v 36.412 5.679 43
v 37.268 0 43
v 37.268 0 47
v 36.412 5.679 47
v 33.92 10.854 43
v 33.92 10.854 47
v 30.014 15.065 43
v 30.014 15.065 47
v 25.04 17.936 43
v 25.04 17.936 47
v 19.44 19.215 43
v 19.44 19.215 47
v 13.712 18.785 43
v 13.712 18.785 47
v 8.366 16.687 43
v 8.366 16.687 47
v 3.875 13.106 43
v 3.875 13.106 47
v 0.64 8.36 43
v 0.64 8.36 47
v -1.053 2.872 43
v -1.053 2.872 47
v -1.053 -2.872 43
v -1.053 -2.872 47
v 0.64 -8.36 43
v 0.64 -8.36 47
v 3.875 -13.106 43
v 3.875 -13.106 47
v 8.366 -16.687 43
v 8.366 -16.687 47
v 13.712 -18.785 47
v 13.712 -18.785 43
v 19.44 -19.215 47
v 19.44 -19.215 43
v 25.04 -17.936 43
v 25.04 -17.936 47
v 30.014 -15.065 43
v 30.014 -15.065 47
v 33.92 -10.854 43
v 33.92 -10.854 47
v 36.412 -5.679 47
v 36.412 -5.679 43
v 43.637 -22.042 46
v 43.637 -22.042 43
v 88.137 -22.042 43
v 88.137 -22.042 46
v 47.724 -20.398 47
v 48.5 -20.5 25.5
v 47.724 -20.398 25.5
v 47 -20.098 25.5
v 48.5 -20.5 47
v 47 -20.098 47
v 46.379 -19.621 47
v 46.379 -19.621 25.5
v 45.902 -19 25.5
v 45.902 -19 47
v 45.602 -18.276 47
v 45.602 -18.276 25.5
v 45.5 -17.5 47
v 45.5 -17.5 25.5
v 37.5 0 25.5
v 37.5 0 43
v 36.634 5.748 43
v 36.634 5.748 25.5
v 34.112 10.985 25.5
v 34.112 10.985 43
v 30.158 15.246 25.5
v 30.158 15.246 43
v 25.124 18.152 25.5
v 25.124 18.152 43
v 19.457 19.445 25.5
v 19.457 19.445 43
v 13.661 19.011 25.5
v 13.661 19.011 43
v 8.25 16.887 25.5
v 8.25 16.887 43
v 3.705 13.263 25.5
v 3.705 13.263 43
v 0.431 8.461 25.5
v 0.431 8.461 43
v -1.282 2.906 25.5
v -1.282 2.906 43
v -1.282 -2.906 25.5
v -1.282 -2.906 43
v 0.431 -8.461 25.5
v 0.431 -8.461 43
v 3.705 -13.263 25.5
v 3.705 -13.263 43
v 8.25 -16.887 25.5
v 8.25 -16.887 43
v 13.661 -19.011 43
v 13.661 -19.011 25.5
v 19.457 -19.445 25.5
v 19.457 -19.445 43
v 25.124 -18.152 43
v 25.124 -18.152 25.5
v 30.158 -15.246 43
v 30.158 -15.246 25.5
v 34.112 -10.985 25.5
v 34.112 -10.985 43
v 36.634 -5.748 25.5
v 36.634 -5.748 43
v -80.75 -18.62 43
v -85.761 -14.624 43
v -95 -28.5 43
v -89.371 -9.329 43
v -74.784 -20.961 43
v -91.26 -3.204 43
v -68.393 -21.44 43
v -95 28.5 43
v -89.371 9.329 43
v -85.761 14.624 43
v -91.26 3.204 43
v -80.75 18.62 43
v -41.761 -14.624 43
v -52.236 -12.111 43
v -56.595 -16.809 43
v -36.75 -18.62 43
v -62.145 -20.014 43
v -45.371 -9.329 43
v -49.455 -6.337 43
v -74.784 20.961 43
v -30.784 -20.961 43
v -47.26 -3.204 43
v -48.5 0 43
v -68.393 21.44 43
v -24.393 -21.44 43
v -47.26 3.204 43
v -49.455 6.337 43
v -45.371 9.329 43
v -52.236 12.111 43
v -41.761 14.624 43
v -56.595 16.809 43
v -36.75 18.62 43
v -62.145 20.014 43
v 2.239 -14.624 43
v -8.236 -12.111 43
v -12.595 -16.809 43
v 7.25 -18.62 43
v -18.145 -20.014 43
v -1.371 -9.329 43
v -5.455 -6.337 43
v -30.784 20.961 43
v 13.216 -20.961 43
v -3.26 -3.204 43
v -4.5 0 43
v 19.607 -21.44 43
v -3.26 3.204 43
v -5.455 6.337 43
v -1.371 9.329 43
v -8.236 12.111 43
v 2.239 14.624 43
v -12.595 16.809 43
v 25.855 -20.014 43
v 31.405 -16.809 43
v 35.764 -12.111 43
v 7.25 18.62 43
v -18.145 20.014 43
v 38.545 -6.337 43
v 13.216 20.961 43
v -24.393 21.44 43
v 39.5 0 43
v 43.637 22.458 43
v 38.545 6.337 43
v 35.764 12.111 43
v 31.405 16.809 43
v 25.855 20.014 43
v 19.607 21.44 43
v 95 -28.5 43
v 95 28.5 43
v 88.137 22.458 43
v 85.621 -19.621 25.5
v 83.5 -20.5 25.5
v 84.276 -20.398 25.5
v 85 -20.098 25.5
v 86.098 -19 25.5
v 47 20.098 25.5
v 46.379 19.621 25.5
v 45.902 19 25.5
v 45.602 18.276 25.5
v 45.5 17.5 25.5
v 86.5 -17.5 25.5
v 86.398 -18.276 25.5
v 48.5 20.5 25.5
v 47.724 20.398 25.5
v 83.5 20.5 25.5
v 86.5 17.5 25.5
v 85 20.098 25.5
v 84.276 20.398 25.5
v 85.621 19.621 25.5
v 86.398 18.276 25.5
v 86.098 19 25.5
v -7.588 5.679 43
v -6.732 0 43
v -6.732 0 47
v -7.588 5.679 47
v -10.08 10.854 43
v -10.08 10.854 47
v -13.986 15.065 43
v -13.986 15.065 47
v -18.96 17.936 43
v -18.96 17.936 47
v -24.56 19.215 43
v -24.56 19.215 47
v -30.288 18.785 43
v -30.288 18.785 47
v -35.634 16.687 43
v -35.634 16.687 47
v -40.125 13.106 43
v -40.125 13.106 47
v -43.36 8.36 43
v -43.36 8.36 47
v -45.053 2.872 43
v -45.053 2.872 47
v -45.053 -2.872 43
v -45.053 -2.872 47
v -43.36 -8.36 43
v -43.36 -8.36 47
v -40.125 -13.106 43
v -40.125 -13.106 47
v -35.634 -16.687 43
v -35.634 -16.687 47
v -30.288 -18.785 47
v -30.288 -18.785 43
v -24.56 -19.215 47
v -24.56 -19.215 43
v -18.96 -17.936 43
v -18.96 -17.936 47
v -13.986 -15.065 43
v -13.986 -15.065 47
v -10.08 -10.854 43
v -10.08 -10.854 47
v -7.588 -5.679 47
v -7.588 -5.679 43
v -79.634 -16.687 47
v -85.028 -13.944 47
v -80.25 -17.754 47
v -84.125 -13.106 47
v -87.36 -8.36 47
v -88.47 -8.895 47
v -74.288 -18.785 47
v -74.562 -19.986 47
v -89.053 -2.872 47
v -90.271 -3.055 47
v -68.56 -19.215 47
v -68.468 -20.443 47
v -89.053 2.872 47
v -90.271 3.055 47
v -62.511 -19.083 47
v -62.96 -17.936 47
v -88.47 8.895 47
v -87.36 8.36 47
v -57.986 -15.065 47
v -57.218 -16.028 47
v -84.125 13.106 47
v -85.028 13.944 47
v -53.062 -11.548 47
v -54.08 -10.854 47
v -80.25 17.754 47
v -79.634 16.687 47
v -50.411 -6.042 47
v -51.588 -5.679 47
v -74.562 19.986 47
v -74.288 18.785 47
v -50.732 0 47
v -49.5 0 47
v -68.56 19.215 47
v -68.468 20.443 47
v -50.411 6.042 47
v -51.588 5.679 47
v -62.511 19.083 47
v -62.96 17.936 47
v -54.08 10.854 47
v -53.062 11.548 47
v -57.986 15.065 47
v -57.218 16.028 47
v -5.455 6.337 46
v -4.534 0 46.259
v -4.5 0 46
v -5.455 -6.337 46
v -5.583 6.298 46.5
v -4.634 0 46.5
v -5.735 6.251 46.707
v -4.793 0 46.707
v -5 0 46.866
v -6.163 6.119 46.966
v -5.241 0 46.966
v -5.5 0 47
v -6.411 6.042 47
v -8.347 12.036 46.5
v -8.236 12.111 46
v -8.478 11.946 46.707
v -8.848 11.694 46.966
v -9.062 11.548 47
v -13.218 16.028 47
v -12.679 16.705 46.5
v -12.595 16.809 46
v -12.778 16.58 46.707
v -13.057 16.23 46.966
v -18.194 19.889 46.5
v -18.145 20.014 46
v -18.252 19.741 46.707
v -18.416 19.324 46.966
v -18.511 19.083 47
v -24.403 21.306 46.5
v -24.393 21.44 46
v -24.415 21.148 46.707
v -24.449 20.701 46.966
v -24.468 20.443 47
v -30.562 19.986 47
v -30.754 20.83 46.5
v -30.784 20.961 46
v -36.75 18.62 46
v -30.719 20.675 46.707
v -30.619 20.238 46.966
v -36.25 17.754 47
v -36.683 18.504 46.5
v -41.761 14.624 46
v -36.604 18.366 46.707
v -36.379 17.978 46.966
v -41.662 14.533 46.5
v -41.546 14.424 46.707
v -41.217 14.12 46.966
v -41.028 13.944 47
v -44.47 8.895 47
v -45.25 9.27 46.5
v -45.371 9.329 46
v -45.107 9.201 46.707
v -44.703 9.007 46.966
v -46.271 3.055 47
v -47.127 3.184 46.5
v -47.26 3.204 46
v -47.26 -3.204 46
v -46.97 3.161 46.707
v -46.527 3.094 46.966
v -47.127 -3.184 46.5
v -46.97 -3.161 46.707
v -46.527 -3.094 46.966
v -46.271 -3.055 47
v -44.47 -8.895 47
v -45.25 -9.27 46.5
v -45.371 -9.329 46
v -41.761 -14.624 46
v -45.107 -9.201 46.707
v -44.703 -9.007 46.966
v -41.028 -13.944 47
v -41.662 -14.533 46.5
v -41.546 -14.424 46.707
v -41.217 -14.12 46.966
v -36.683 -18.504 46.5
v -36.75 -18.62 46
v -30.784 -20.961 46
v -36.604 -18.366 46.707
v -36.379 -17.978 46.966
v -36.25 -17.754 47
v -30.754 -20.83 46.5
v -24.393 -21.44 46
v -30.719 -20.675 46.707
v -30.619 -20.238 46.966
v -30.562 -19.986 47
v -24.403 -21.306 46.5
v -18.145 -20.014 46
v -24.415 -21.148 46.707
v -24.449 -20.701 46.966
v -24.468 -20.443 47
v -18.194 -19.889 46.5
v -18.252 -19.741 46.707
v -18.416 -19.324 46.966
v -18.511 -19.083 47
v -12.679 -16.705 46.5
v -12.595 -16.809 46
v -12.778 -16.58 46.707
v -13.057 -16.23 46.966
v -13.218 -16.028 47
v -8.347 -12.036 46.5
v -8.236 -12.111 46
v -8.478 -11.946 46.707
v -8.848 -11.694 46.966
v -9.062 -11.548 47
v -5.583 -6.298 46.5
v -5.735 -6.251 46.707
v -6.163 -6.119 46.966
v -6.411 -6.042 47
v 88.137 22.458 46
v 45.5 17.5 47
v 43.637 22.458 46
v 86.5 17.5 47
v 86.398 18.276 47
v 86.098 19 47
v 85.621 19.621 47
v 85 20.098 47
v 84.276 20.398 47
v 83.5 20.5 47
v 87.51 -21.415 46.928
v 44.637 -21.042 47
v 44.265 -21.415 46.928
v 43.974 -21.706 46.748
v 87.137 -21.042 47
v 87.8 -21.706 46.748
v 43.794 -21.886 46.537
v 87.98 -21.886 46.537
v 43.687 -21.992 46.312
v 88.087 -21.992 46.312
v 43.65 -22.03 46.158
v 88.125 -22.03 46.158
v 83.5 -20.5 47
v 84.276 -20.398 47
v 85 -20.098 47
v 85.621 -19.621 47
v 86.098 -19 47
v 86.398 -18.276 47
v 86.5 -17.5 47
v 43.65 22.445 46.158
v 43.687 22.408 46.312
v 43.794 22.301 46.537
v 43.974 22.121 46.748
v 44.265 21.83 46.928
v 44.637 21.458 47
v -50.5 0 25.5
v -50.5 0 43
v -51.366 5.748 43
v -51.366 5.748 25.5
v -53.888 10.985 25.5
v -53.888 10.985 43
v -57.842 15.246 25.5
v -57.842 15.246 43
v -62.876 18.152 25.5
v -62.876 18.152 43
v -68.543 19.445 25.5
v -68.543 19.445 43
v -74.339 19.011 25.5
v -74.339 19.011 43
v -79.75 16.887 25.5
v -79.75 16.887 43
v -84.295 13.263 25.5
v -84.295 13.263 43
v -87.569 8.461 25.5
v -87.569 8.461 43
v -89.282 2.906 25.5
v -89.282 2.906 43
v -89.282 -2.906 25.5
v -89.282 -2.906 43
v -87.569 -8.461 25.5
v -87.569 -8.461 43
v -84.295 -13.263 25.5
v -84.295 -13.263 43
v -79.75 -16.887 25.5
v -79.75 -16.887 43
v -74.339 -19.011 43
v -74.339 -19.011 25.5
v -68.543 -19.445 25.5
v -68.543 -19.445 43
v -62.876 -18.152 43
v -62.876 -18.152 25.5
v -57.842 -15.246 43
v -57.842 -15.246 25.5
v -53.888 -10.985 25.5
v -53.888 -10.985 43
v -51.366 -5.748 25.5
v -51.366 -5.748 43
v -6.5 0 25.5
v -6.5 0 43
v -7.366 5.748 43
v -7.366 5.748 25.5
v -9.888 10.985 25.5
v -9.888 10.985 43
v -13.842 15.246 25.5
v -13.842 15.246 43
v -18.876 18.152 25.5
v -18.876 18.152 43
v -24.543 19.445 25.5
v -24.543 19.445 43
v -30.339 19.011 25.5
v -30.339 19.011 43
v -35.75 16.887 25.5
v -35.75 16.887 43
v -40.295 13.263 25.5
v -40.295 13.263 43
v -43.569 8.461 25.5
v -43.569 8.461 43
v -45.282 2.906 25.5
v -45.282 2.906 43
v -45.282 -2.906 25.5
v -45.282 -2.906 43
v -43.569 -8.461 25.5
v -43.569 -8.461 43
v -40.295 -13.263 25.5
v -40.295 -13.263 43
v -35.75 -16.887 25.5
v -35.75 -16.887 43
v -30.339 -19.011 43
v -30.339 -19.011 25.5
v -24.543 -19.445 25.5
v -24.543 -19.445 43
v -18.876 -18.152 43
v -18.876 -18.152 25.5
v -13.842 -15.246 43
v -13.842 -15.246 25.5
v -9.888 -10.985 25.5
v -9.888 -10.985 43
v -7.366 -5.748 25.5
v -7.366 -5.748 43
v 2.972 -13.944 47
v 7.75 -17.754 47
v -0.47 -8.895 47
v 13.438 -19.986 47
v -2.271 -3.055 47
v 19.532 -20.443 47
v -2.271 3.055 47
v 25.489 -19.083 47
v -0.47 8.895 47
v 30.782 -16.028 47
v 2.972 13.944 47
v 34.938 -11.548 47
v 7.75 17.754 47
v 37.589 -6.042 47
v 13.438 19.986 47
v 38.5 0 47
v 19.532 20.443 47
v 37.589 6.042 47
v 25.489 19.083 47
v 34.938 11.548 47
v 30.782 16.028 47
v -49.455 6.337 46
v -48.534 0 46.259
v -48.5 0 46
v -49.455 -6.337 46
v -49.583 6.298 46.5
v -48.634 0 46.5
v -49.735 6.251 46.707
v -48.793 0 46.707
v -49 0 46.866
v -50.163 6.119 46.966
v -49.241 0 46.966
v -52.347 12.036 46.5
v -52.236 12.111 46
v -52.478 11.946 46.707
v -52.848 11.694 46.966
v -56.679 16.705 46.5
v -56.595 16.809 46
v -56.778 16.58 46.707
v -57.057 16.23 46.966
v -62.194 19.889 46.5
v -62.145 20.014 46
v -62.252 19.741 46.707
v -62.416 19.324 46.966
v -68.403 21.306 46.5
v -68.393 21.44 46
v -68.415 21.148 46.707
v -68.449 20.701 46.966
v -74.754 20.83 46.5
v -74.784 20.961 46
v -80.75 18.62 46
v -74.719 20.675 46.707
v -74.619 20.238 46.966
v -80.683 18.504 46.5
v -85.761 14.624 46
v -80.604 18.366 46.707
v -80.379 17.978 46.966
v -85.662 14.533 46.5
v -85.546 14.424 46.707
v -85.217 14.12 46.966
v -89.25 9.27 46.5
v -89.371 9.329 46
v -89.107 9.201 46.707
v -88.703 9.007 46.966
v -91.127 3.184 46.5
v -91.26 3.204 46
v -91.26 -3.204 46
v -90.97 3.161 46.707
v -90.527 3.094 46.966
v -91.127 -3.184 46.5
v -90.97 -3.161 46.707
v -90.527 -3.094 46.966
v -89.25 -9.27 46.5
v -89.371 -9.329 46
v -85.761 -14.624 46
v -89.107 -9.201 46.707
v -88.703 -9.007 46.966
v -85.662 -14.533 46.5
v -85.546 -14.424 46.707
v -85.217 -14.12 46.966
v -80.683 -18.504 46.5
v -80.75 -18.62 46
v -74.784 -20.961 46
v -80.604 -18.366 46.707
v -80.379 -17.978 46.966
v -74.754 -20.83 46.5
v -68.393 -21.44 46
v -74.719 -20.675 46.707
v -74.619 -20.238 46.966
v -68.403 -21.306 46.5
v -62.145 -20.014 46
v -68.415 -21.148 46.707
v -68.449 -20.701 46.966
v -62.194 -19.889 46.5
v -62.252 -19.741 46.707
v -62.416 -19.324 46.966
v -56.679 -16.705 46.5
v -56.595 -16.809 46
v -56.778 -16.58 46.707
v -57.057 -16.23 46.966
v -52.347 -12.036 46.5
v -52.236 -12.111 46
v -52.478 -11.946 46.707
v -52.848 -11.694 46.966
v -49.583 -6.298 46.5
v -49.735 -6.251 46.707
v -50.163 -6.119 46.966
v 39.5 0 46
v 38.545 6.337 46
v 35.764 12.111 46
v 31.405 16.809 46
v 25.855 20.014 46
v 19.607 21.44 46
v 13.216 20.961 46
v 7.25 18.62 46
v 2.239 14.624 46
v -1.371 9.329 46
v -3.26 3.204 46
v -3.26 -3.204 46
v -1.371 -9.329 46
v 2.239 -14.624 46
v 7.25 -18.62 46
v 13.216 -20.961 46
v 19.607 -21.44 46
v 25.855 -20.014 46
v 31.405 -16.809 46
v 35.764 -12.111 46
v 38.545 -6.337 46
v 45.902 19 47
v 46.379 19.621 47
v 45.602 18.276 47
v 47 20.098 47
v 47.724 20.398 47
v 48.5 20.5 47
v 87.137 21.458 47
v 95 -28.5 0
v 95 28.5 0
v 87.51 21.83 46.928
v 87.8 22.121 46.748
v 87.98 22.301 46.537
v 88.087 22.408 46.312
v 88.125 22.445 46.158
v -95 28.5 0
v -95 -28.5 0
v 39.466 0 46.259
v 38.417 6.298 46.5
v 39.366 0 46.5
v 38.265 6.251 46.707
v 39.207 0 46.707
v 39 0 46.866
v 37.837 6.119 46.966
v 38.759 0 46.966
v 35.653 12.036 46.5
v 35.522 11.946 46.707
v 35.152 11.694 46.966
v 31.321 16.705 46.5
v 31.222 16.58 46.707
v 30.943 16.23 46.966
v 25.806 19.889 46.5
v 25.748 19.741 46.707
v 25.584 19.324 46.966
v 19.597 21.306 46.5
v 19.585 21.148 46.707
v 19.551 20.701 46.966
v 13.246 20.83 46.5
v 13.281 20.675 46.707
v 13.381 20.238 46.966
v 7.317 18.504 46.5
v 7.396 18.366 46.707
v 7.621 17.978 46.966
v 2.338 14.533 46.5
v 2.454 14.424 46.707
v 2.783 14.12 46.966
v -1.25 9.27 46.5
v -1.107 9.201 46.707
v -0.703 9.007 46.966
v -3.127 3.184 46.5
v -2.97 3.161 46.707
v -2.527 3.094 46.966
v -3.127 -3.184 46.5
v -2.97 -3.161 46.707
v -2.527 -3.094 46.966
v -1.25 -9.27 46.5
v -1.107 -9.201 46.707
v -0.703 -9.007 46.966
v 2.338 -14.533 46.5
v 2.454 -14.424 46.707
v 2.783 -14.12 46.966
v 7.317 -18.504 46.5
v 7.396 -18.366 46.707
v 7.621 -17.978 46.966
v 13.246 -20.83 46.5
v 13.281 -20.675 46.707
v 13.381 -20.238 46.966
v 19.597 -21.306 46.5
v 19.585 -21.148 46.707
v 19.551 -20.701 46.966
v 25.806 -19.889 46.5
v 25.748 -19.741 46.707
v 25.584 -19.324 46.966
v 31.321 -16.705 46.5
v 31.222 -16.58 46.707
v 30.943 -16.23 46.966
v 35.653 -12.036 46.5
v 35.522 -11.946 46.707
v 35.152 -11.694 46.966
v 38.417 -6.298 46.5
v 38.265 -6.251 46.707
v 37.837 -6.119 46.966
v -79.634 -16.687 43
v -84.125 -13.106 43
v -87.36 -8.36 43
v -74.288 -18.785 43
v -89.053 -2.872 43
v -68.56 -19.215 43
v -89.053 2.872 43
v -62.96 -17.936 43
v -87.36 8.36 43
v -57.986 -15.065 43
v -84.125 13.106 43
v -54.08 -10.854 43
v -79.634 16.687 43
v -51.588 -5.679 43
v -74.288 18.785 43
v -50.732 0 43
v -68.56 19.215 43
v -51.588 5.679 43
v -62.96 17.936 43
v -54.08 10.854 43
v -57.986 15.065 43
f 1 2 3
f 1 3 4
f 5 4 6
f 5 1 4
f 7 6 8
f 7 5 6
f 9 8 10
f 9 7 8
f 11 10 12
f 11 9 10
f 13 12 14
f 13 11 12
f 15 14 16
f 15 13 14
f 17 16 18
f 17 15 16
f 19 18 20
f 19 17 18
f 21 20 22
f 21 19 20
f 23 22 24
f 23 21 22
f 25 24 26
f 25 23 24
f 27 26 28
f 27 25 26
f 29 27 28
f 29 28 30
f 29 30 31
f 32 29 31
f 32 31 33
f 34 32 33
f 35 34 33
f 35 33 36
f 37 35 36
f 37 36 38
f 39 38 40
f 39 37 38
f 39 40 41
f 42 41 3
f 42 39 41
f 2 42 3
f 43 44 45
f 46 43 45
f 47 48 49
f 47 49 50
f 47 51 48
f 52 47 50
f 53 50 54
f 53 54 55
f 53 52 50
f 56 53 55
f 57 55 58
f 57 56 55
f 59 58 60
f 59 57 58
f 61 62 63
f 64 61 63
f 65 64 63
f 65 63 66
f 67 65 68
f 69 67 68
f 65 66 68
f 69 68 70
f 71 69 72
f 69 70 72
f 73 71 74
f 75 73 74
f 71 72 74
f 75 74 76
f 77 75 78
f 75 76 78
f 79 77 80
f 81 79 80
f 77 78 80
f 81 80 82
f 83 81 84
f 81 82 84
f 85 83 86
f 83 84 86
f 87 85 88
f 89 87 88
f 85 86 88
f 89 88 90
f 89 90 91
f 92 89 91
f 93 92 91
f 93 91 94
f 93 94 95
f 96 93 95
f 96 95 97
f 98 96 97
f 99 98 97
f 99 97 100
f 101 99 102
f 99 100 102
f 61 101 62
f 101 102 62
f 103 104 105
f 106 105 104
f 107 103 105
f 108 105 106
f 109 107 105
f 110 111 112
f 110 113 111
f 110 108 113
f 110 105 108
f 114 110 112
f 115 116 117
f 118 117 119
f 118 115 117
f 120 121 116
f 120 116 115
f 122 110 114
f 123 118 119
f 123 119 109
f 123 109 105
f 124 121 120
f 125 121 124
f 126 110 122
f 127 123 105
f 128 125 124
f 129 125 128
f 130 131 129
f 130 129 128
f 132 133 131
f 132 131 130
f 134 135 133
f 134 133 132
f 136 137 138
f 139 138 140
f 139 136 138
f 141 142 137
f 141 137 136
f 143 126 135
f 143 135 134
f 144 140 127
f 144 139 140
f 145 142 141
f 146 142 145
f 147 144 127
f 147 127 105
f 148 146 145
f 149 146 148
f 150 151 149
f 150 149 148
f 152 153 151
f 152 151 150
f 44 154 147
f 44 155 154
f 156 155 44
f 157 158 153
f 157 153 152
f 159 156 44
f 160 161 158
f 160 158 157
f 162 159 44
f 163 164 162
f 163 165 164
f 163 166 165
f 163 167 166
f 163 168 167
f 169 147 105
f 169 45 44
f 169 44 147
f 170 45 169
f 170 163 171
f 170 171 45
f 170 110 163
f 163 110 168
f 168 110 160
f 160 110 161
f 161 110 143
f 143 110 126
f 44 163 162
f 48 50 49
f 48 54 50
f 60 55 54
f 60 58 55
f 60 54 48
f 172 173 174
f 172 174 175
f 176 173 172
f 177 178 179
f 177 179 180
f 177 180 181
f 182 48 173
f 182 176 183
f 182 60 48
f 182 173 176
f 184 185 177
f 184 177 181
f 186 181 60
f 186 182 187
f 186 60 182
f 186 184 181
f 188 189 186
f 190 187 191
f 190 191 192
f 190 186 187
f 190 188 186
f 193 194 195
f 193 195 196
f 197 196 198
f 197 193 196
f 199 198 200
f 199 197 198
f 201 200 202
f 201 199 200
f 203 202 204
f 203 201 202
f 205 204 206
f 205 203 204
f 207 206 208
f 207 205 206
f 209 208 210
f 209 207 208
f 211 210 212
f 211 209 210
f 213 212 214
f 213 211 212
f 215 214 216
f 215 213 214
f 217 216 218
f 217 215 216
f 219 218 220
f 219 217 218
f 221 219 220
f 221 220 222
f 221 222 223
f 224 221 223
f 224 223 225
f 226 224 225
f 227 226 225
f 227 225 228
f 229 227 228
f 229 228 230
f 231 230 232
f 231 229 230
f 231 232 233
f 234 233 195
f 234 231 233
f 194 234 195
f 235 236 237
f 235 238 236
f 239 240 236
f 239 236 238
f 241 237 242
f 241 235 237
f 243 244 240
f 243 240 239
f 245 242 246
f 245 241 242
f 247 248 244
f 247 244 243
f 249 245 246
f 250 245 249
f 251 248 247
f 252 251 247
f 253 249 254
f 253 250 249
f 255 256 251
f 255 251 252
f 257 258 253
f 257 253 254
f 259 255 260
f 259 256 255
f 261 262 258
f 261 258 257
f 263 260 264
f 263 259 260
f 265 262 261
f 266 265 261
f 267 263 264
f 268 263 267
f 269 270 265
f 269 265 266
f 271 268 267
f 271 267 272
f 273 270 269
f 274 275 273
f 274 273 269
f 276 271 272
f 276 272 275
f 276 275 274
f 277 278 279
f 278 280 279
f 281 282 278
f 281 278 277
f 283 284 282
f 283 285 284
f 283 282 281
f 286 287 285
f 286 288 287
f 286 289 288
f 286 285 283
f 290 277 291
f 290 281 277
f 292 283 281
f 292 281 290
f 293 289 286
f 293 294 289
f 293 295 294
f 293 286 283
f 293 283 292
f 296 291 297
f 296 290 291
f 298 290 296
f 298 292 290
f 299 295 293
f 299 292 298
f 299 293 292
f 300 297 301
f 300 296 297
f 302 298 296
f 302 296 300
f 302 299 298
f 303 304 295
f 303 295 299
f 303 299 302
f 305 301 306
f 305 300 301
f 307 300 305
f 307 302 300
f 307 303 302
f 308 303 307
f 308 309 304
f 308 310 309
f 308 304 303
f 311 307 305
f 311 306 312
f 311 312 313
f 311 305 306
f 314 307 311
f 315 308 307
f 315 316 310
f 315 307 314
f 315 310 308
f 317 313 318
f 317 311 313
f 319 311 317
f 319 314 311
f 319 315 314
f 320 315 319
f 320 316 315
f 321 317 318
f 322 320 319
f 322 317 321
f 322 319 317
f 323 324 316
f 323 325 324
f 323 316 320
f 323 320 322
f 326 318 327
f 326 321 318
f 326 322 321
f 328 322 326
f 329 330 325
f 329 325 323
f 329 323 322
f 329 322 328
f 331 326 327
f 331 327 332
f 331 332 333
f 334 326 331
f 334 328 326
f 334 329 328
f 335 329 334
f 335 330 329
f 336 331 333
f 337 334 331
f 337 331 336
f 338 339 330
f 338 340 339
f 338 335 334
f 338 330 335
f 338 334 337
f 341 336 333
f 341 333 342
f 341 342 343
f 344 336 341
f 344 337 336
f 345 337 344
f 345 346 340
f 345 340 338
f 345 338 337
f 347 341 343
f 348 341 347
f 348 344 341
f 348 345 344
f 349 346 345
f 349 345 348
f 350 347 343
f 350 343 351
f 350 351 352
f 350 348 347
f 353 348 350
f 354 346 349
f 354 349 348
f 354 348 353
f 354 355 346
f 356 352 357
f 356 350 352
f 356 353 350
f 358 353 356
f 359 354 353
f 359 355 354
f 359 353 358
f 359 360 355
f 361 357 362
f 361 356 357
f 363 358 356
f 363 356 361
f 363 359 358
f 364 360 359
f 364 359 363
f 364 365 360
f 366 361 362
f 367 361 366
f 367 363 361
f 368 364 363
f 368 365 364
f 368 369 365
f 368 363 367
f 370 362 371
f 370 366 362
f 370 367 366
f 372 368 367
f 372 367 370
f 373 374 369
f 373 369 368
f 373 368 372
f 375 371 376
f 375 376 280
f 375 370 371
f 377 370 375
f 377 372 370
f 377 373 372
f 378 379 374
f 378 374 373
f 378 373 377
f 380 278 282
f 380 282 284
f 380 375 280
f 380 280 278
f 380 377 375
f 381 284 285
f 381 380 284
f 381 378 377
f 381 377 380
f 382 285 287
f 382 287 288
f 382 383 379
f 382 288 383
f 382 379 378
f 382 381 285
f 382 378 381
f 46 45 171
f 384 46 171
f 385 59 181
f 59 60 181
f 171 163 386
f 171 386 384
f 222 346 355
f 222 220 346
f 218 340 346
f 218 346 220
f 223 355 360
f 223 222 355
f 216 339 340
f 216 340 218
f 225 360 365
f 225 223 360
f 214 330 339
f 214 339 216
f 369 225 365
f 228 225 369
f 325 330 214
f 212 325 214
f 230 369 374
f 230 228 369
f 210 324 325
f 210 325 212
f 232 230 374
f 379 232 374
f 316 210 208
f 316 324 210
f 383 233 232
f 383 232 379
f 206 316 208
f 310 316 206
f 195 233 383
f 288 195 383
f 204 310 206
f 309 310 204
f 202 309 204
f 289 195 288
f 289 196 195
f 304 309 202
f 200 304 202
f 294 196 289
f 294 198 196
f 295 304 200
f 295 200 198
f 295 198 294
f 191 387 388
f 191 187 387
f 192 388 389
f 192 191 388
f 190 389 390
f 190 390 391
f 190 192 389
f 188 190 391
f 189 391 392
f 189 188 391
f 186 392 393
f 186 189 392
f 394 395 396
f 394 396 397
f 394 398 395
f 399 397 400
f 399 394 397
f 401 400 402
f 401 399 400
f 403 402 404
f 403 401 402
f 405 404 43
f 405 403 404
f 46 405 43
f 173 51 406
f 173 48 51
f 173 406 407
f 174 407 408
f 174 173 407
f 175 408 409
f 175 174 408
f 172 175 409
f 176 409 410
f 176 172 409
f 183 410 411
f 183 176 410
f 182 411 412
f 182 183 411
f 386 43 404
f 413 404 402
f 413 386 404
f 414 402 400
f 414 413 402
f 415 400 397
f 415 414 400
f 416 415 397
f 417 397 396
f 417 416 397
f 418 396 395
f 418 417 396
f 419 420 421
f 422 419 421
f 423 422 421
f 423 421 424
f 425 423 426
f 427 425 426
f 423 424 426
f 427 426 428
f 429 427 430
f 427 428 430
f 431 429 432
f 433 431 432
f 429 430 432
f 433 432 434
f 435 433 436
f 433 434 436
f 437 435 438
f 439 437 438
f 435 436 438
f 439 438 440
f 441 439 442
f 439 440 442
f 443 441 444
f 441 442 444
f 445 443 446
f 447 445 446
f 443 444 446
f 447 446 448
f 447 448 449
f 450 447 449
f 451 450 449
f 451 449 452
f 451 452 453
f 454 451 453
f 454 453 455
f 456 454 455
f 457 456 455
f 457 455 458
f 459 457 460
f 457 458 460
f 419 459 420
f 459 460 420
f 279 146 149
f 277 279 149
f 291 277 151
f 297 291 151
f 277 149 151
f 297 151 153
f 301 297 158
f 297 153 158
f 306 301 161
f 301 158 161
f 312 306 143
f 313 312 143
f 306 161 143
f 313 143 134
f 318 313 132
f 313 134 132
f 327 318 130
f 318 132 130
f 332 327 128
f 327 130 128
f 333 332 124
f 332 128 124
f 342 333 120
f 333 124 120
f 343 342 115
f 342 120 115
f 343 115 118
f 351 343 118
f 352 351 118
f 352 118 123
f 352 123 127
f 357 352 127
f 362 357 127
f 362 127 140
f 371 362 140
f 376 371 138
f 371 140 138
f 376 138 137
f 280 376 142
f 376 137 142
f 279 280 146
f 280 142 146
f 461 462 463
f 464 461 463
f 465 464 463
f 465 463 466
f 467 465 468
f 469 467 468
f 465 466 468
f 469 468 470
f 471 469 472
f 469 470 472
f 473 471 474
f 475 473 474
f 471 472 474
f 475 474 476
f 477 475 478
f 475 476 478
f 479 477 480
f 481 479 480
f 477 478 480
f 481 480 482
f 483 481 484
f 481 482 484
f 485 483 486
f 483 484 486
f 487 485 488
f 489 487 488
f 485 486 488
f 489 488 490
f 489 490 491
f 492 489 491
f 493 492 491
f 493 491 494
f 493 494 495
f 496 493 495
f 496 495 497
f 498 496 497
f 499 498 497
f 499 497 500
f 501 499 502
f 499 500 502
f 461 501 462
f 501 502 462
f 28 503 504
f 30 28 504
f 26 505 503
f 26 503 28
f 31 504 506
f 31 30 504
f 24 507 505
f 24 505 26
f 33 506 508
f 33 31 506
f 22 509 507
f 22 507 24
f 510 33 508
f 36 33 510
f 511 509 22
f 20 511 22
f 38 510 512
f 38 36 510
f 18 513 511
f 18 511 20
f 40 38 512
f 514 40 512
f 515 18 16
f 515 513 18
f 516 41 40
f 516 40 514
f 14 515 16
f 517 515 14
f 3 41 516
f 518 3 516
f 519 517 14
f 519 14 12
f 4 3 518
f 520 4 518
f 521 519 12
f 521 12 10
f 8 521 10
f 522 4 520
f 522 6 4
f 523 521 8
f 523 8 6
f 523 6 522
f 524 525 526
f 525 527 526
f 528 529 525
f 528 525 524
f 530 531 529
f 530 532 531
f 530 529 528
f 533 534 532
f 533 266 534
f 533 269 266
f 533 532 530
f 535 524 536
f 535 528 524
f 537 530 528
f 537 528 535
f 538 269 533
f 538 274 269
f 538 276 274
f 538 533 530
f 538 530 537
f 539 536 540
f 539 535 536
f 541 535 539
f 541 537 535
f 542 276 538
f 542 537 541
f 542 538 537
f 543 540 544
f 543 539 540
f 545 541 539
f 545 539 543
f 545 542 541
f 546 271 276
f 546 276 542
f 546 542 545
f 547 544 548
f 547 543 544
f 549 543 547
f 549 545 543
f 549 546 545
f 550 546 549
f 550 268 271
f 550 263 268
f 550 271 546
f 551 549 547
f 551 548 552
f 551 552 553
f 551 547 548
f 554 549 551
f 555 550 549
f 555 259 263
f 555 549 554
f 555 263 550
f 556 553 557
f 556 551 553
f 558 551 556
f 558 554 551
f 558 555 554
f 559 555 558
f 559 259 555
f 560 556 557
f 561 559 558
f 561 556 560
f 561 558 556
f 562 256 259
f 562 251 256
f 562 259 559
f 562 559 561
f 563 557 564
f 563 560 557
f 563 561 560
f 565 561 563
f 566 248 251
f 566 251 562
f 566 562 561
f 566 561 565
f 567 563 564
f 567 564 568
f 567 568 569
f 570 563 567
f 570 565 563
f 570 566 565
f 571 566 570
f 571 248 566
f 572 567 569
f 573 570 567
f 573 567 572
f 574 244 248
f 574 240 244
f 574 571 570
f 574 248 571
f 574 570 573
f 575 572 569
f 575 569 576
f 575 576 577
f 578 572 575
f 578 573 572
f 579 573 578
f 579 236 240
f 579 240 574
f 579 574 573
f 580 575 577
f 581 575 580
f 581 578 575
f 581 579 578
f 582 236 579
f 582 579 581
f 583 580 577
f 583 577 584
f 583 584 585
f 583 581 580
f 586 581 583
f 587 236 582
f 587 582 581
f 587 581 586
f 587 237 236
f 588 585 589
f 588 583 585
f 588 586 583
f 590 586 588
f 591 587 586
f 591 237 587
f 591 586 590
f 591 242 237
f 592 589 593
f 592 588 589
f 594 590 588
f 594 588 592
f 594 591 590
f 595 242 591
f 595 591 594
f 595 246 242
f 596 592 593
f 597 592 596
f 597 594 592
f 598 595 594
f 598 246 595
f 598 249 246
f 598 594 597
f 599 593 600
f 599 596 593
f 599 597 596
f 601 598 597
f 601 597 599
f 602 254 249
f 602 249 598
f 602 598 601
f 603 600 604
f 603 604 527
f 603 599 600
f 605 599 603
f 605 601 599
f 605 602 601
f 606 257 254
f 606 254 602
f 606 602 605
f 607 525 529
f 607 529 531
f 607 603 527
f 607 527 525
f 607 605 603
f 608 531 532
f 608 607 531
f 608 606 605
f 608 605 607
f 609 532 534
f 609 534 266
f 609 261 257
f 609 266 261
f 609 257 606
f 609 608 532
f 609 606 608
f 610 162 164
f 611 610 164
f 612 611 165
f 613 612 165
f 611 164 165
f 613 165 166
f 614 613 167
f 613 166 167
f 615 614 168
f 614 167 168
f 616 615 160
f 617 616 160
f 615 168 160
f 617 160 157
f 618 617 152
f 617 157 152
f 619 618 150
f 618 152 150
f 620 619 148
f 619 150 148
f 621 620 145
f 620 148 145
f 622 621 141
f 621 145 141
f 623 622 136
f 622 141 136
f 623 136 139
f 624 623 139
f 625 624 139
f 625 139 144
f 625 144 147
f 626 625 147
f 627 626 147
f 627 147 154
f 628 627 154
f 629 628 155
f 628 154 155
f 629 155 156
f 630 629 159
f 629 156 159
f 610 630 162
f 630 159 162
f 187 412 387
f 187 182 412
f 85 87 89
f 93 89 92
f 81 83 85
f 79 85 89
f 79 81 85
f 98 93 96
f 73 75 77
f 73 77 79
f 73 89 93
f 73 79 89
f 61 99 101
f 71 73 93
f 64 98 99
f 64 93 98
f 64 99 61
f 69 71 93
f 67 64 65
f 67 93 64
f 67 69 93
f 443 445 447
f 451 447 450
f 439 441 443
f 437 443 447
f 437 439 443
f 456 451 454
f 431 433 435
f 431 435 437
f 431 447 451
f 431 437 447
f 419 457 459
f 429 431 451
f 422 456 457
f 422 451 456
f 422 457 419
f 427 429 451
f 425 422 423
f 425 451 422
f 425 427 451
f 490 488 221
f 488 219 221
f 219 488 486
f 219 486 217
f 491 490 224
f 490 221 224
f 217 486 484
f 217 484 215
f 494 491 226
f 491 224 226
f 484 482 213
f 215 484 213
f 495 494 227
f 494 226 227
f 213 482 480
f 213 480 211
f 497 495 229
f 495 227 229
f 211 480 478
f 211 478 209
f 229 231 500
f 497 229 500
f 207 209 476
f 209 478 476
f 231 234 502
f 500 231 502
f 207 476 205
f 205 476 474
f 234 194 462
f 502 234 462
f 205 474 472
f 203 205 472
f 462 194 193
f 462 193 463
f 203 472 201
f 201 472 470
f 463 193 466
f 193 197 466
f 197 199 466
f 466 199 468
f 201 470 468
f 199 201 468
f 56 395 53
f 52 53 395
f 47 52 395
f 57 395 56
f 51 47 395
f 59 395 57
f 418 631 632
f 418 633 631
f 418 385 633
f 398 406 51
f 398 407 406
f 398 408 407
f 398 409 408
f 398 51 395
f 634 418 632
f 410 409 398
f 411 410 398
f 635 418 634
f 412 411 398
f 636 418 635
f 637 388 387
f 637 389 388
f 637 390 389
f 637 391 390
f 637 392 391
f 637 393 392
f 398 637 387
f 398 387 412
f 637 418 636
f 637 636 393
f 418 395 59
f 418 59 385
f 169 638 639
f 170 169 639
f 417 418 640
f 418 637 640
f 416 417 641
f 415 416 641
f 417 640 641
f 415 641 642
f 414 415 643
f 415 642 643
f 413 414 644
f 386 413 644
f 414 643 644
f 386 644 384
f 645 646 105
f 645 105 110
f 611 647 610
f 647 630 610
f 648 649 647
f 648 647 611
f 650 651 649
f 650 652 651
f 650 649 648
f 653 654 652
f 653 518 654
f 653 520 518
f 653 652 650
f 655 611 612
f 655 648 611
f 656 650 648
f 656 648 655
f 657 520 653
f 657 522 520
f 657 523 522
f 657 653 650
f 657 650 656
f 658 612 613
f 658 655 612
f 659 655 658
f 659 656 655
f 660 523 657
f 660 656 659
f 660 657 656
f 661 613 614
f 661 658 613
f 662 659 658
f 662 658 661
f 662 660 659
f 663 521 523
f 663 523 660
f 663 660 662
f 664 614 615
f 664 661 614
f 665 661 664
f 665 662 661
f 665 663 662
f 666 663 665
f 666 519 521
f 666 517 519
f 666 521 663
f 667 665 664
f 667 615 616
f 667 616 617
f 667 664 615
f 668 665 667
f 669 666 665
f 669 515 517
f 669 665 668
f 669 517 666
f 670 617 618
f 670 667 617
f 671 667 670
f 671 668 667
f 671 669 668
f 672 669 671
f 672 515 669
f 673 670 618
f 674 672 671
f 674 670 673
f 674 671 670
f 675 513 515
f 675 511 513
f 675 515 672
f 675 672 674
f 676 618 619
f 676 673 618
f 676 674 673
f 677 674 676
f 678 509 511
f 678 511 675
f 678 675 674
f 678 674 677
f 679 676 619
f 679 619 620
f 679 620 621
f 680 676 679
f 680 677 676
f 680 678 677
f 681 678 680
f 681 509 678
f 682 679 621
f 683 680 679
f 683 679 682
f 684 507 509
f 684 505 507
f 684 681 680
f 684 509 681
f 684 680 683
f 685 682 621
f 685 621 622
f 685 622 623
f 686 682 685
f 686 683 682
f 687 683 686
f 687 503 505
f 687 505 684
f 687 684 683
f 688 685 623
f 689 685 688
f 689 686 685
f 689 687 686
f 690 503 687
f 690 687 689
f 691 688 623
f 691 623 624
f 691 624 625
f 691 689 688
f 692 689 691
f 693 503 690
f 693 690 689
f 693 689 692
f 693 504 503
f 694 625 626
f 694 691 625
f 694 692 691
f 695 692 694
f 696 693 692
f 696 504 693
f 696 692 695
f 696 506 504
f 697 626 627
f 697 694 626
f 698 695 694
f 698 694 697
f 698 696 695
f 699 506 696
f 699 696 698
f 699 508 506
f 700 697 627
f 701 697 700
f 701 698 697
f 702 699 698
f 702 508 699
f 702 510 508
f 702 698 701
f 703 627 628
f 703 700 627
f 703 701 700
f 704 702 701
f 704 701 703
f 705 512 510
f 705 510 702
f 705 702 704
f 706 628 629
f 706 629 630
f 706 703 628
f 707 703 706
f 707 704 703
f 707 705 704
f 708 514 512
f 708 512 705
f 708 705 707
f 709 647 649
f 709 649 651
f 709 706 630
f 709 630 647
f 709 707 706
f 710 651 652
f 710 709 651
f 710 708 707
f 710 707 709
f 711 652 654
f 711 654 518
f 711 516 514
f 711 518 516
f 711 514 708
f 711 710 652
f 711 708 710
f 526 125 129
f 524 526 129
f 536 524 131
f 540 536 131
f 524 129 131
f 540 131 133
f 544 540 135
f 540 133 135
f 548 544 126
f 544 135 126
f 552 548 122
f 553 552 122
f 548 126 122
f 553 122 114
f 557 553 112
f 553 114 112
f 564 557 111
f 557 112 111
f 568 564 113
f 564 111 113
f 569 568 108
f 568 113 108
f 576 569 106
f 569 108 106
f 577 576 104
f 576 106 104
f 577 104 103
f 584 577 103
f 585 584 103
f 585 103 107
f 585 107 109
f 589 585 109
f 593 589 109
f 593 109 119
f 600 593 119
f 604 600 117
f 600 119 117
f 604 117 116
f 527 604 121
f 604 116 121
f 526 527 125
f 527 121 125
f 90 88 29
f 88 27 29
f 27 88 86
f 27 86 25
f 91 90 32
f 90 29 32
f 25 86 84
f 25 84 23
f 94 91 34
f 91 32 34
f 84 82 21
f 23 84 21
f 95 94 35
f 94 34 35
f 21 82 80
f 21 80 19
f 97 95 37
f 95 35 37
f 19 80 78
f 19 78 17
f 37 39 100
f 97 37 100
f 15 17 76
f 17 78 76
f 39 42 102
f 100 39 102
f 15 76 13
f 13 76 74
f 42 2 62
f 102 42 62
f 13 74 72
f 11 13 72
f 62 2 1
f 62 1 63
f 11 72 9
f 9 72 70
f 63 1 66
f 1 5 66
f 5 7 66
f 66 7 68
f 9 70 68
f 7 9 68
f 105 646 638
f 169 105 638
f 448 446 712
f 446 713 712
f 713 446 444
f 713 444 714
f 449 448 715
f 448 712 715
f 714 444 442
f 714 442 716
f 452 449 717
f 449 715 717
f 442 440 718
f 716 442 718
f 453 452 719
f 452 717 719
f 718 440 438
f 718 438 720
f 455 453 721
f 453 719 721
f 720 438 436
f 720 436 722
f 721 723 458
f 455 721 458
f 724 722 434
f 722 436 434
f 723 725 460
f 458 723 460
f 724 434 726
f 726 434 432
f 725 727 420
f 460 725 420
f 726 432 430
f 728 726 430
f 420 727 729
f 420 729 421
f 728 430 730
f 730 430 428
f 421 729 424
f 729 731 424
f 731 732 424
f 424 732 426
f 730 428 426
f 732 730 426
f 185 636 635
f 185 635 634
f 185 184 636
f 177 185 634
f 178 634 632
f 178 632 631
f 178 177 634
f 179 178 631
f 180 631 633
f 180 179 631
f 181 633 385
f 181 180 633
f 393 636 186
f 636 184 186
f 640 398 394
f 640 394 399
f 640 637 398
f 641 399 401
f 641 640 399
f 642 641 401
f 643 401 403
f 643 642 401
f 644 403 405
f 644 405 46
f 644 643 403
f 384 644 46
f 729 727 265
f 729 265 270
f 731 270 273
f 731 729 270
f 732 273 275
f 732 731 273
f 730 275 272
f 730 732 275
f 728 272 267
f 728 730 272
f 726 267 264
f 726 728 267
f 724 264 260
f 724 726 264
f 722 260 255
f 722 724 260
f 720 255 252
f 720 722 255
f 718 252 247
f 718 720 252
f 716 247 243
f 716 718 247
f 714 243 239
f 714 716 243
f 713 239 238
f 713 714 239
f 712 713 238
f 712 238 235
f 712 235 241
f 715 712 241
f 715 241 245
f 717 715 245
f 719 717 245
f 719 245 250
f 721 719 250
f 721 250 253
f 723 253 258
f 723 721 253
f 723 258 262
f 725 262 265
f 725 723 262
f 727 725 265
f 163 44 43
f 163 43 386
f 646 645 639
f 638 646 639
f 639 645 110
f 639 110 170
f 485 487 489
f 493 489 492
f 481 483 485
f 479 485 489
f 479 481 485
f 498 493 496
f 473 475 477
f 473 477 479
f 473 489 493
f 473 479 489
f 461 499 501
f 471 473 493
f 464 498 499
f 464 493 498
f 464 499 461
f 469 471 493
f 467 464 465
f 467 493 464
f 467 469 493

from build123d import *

# Parameters (mm, degrees)
SKETCH_W      = 190
SKETCH_H      = 57
PAD_DEPTH     = 43
SKETCH001_R   = 19.5
SKETCH001_W   = 41
SKETCH001_H   = 41
POCKET_DEPTH  = 17.5
SKETCH002_R   = 21.5
SKETCH002_R_2 = 19.268398
SKETCH002_W   = 44.5
SKETCH002_H   = 44.5
SKETCH002_W_2 = 41
SKETCH002_H_2 = 41
PAD001_DEPTH  = 4
FILLET_R      = 1
FILLET001_R   = 3


with BuildPart() as part:
    # Sketch → Pad (new body)
    with BuildSketch(Plane.XY):
        Rectangle(SKETCH_W, SKETCH_H)
    extrude(amount=PAD_DEPTH)

    # Sketch001 (on Face6 of Pad) → Pocket (cut)
    with BuildSketch(Plane.XY.offset(43)):
        with Locations((-70, 0)):
            Circle(SKETCH001_R)
        with Locations((-26, 0)):
            Circle(SKETCH001_R)
        with Locations((18, 0)):
            Circle(SKETCH001_R)
        with Locations((66, 0)):
            Rectangle(SKETCH001_W, SKETCH001_H)
    extrude(amount=-POCKET_DEPTH, mode=Mode.SUBTRACT)

    # Sketch002 (on Face5 of Pocket) → Pad001 (join)
    with BuildSketch(Plane.XY.offset(43)):
        with Locations((-70, 0)):
            Circle(SKETCH002_R)
        with Locations((-70, 0)):
            Circle(SKETCH002_R_2, mode=Mode.SUBTRACT)
        with Locations((-26, 0)):
            Circle(SKETCH002_R)
        with Locations((-26, 0)):
            Circle(SKETCH002_R_2, mode=Mode.SUBTRACT)
        with Locations((18, 0)):
            Circle(SKETCH002_R)
        with Locations((18, 0)):
            Circle(SKETCH002_R_2, mode=Mode.SUBTRACT)
        with Locations((65.887117, 0.207737)):
            Rectangle(SKETCH002_W, SKETCH002_H)
        with Locations((66, 0)):
            Rectangle(SKETCH002_W_2, SKETCH002_H_2, mode=Mode.SUBTRACT)
    extrude(amount=PAD001_DEPTH)

    # Fillet
    fillet_edges = [part.edges().sort_by_distance(p)[0] for p in [
        (-91.5, 0, 47),
        (-47.5, 0, 47),
        (-3.5, 0, 47),
        (65.887117, -22.042263, 47),
        (88.137117, 0.207737, 47),
        (65.887117, 22.457737, 47),
        (43.637117, 0.207737, 47),
    ]]
    fillet(fillet_edges, radius=FILLET_R)

    # Fillet001
    fillet001_edges = [part.edges().sort_by_distance(p)[0] for p in [
        (45.5, -20.5, 34.25),
        (45.5, -20.5, 45),
        (45.5, 20.5, 34.25),
        (45.5, 20.5, 45),
        (86.5, 20.5, 34.25),
        (86.5, -20.5, 34.25),
        (86.5, -20.5, 45),
        (86.5, 20.5, 45),
    ]]
    fillet(fillet001_edges, radius=FILLET001_R)


solid = part.part
